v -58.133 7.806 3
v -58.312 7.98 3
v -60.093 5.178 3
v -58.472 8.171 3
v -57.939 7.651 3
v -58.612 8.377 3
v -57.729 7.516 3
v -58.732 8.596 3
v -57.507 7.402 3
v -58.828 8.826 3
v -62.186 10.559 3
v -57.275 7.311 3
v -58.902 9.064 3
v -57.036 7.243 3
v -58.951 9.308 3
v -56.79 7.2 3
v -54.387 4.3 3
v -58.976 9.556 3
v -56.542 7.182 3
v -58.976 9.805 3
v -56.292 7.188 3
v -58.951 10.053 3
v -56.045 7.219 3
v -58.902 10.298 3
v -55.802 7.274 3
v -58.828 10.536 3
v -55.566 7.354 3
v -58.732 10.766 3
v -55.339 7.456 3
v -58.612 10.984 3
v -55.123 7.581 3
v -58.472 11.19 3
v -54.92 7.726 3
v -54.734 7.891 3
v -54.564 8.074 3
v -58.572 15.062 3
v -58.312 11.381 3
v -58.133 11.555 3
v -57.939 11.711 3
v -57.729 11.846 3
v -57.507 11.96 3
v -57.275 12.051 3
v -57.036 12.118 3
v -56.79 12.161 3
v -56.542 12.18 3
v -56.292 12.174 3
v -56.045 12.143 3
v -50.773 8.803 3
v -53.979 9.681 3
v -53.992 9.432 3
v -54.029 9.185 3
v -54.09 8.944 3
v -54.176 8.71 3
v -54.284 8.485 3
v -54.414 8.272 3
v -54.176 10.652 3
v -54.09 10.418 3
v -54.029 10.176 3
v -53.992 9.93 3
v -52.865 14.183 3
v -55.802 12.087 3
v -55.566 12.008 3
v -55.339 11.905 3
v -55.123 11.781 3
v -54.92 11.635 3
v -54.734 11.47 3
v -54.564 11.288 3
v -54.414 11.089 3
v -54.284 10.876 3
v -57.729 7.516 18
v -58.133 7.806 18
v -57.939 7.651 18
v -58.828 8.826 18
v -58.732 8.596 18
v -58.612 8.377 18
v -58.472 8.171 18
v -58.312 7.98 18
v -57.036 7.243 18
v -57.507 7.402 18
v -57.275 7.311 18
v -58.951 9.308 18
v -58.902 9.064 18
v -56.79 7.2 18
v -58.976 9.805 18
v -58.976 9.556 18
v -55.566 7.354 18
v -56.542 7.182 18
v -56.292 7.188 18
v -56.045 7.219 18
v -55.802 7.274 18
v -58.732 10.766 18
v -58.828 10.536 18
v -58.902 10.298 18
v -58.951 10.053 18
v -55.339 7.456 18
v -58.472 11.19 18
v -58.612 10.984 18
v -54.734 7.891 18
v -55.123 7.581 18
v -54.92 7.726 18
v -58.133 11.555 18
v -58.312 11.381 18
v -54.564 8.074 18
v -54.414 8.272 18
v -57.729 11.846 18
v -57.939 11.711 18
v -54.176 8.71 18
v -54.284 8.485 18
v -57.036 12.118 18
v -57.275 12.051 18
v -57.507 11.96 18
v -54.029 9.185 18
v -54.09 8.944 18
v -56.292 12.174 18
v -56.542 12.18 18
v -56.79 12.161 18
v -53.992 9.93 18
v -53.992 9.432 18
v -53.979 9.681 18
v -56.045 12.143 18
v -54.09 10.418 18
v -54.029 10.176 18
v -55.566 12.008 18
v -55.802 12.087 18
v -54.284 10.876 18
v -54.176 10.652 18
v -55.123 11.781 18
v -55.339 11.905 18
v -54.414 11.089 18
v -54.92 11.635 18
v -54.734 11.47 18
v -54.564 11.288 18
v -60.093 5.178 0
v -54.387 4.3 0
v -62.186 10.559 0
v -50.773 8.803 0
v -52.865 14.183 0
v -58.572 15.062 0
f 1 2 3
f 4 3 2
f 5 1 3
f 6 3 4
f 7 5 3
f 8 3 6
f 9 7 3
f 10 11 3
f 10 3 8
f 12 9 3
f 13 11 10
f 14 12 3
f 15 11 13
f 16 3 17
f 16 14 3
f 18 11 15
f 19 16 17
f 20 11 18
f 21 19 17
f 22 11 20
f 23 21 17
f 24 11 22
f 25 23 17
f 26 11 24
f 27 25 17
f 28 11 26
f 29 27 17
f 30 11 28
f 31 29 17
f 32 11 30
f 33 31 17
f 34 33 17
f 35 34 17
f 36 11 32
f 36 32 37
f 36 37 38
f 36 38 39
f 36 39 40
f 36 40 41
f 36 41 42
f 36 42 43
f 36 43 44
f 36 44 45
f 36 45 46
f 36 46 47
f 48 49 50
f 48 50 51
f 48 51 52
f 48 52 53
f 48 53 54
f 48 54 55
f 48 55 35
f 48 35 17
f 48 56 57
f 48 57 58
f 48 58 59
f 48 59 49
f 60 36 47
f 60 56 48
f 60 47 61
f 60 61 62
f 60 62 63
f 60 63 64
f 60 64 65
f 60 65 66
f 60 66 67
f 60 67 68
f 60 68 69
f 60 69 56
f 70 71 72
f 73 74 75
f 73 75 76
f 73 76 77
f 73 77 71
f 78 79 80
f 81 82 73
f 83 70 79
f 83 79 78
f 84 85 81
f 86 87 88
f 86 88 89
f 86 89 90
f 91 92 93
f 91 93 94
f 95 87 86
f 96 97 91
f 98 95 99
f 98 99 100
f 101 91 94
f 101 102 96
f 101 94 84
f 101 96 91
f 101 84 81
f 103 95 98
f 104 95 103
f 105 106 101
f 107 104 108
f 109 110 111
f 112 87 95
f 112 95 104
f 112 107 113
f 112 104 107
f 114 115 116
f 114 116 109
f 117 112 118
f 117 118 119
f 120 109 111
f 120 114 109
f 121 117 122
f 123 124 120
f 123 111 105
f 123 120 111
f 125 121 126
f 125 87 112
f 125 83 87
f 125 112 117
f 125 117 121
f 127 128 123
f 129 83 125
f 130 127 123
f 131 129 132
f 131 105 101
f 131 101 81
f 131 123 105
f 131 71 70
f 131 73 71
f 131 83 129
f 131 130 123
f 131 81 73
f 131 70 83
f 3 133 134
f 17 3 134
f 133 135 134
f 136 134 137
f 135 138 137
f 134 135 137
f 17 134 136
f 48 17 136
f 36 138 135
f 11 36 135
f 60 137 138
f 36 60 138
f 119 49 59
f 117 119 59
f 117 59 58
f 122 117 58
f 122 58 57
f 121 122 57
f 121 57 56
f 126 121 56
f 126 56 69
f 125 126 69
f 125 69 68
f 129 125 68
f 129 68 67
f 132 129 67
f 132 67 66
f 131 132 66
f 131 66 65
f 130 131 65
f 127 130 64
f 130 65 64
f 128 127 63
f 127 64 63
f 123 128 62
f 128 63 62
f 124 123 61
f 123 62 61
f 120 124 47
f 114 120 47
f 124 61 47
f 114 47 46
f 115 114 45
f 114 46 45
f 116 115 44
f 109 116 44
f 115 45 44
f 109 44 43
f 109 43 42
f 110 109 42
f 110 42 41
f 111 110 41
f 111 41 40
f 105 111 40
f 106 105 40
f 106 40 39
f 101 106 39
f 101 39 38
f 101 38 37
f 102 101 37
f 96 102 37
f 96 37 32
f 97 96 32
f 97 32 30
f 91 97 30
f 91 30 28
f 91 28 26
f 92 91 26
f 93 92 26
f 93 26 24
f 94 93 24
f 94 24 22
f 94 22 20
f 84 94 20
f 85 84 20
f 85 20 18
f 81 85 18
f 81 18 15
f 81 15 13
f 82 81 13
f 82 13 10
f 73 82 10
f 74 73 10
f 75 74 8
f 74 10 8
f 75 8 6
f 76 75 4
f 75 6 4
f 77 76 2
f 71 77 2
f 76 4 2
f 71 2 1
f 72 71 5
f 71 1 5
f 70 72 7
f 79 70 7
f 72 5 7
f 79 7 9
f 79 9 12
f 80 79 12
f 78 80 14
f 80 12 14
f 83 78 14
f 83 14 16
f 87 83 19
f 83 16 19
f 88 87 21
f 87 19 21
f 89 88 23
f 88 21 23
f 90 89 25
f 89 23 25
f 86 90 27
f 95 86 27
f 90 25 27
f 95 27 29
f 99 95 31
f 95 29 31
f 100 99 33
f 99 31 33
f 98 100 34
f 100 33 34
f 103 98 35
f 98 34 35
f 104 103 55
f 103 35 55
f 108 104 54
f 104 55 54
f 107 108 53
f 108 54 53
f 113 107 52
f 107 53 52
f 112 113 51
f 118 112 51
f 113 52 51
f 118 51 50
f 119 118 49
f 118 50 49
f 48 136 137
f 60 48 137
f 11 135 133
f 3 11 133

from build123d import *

# Parameters (mm, degrees)
SALIENTE_EXTRUIR3_DEPTH = 3
CROQUIS3_R              = 2.5
SALIENTE_EXTRUIR4_DEPTH = 18


with BuildPart() as part:
    # Croquis1 → Saliente-Extruir3 (new body)
    with BuildSketch(Plane.XY):
        Polygon((-54.386636348, 4.299863782), (-50.772905222, 8.802560828), (-52.865489687, 14.183492308), (-58.571805277, 15.061726742), (-62.185536402, 10.559029696), (-60.092951938, 5.178098216), align=None)
    extrude(amount=SALIENTE_EXTRUIR3_DEPTH)

    # Croquis3 → Saliente-Extruir4 (add)
    with BuildSketch(Plane.XY):
        with Locations((-56.479220812, 9.680795262)):
            Circle(CROQUIS3_R)
    extrude(amount=SALIENTE_EXTRUIR4_DEPTH)


solid = part.part
